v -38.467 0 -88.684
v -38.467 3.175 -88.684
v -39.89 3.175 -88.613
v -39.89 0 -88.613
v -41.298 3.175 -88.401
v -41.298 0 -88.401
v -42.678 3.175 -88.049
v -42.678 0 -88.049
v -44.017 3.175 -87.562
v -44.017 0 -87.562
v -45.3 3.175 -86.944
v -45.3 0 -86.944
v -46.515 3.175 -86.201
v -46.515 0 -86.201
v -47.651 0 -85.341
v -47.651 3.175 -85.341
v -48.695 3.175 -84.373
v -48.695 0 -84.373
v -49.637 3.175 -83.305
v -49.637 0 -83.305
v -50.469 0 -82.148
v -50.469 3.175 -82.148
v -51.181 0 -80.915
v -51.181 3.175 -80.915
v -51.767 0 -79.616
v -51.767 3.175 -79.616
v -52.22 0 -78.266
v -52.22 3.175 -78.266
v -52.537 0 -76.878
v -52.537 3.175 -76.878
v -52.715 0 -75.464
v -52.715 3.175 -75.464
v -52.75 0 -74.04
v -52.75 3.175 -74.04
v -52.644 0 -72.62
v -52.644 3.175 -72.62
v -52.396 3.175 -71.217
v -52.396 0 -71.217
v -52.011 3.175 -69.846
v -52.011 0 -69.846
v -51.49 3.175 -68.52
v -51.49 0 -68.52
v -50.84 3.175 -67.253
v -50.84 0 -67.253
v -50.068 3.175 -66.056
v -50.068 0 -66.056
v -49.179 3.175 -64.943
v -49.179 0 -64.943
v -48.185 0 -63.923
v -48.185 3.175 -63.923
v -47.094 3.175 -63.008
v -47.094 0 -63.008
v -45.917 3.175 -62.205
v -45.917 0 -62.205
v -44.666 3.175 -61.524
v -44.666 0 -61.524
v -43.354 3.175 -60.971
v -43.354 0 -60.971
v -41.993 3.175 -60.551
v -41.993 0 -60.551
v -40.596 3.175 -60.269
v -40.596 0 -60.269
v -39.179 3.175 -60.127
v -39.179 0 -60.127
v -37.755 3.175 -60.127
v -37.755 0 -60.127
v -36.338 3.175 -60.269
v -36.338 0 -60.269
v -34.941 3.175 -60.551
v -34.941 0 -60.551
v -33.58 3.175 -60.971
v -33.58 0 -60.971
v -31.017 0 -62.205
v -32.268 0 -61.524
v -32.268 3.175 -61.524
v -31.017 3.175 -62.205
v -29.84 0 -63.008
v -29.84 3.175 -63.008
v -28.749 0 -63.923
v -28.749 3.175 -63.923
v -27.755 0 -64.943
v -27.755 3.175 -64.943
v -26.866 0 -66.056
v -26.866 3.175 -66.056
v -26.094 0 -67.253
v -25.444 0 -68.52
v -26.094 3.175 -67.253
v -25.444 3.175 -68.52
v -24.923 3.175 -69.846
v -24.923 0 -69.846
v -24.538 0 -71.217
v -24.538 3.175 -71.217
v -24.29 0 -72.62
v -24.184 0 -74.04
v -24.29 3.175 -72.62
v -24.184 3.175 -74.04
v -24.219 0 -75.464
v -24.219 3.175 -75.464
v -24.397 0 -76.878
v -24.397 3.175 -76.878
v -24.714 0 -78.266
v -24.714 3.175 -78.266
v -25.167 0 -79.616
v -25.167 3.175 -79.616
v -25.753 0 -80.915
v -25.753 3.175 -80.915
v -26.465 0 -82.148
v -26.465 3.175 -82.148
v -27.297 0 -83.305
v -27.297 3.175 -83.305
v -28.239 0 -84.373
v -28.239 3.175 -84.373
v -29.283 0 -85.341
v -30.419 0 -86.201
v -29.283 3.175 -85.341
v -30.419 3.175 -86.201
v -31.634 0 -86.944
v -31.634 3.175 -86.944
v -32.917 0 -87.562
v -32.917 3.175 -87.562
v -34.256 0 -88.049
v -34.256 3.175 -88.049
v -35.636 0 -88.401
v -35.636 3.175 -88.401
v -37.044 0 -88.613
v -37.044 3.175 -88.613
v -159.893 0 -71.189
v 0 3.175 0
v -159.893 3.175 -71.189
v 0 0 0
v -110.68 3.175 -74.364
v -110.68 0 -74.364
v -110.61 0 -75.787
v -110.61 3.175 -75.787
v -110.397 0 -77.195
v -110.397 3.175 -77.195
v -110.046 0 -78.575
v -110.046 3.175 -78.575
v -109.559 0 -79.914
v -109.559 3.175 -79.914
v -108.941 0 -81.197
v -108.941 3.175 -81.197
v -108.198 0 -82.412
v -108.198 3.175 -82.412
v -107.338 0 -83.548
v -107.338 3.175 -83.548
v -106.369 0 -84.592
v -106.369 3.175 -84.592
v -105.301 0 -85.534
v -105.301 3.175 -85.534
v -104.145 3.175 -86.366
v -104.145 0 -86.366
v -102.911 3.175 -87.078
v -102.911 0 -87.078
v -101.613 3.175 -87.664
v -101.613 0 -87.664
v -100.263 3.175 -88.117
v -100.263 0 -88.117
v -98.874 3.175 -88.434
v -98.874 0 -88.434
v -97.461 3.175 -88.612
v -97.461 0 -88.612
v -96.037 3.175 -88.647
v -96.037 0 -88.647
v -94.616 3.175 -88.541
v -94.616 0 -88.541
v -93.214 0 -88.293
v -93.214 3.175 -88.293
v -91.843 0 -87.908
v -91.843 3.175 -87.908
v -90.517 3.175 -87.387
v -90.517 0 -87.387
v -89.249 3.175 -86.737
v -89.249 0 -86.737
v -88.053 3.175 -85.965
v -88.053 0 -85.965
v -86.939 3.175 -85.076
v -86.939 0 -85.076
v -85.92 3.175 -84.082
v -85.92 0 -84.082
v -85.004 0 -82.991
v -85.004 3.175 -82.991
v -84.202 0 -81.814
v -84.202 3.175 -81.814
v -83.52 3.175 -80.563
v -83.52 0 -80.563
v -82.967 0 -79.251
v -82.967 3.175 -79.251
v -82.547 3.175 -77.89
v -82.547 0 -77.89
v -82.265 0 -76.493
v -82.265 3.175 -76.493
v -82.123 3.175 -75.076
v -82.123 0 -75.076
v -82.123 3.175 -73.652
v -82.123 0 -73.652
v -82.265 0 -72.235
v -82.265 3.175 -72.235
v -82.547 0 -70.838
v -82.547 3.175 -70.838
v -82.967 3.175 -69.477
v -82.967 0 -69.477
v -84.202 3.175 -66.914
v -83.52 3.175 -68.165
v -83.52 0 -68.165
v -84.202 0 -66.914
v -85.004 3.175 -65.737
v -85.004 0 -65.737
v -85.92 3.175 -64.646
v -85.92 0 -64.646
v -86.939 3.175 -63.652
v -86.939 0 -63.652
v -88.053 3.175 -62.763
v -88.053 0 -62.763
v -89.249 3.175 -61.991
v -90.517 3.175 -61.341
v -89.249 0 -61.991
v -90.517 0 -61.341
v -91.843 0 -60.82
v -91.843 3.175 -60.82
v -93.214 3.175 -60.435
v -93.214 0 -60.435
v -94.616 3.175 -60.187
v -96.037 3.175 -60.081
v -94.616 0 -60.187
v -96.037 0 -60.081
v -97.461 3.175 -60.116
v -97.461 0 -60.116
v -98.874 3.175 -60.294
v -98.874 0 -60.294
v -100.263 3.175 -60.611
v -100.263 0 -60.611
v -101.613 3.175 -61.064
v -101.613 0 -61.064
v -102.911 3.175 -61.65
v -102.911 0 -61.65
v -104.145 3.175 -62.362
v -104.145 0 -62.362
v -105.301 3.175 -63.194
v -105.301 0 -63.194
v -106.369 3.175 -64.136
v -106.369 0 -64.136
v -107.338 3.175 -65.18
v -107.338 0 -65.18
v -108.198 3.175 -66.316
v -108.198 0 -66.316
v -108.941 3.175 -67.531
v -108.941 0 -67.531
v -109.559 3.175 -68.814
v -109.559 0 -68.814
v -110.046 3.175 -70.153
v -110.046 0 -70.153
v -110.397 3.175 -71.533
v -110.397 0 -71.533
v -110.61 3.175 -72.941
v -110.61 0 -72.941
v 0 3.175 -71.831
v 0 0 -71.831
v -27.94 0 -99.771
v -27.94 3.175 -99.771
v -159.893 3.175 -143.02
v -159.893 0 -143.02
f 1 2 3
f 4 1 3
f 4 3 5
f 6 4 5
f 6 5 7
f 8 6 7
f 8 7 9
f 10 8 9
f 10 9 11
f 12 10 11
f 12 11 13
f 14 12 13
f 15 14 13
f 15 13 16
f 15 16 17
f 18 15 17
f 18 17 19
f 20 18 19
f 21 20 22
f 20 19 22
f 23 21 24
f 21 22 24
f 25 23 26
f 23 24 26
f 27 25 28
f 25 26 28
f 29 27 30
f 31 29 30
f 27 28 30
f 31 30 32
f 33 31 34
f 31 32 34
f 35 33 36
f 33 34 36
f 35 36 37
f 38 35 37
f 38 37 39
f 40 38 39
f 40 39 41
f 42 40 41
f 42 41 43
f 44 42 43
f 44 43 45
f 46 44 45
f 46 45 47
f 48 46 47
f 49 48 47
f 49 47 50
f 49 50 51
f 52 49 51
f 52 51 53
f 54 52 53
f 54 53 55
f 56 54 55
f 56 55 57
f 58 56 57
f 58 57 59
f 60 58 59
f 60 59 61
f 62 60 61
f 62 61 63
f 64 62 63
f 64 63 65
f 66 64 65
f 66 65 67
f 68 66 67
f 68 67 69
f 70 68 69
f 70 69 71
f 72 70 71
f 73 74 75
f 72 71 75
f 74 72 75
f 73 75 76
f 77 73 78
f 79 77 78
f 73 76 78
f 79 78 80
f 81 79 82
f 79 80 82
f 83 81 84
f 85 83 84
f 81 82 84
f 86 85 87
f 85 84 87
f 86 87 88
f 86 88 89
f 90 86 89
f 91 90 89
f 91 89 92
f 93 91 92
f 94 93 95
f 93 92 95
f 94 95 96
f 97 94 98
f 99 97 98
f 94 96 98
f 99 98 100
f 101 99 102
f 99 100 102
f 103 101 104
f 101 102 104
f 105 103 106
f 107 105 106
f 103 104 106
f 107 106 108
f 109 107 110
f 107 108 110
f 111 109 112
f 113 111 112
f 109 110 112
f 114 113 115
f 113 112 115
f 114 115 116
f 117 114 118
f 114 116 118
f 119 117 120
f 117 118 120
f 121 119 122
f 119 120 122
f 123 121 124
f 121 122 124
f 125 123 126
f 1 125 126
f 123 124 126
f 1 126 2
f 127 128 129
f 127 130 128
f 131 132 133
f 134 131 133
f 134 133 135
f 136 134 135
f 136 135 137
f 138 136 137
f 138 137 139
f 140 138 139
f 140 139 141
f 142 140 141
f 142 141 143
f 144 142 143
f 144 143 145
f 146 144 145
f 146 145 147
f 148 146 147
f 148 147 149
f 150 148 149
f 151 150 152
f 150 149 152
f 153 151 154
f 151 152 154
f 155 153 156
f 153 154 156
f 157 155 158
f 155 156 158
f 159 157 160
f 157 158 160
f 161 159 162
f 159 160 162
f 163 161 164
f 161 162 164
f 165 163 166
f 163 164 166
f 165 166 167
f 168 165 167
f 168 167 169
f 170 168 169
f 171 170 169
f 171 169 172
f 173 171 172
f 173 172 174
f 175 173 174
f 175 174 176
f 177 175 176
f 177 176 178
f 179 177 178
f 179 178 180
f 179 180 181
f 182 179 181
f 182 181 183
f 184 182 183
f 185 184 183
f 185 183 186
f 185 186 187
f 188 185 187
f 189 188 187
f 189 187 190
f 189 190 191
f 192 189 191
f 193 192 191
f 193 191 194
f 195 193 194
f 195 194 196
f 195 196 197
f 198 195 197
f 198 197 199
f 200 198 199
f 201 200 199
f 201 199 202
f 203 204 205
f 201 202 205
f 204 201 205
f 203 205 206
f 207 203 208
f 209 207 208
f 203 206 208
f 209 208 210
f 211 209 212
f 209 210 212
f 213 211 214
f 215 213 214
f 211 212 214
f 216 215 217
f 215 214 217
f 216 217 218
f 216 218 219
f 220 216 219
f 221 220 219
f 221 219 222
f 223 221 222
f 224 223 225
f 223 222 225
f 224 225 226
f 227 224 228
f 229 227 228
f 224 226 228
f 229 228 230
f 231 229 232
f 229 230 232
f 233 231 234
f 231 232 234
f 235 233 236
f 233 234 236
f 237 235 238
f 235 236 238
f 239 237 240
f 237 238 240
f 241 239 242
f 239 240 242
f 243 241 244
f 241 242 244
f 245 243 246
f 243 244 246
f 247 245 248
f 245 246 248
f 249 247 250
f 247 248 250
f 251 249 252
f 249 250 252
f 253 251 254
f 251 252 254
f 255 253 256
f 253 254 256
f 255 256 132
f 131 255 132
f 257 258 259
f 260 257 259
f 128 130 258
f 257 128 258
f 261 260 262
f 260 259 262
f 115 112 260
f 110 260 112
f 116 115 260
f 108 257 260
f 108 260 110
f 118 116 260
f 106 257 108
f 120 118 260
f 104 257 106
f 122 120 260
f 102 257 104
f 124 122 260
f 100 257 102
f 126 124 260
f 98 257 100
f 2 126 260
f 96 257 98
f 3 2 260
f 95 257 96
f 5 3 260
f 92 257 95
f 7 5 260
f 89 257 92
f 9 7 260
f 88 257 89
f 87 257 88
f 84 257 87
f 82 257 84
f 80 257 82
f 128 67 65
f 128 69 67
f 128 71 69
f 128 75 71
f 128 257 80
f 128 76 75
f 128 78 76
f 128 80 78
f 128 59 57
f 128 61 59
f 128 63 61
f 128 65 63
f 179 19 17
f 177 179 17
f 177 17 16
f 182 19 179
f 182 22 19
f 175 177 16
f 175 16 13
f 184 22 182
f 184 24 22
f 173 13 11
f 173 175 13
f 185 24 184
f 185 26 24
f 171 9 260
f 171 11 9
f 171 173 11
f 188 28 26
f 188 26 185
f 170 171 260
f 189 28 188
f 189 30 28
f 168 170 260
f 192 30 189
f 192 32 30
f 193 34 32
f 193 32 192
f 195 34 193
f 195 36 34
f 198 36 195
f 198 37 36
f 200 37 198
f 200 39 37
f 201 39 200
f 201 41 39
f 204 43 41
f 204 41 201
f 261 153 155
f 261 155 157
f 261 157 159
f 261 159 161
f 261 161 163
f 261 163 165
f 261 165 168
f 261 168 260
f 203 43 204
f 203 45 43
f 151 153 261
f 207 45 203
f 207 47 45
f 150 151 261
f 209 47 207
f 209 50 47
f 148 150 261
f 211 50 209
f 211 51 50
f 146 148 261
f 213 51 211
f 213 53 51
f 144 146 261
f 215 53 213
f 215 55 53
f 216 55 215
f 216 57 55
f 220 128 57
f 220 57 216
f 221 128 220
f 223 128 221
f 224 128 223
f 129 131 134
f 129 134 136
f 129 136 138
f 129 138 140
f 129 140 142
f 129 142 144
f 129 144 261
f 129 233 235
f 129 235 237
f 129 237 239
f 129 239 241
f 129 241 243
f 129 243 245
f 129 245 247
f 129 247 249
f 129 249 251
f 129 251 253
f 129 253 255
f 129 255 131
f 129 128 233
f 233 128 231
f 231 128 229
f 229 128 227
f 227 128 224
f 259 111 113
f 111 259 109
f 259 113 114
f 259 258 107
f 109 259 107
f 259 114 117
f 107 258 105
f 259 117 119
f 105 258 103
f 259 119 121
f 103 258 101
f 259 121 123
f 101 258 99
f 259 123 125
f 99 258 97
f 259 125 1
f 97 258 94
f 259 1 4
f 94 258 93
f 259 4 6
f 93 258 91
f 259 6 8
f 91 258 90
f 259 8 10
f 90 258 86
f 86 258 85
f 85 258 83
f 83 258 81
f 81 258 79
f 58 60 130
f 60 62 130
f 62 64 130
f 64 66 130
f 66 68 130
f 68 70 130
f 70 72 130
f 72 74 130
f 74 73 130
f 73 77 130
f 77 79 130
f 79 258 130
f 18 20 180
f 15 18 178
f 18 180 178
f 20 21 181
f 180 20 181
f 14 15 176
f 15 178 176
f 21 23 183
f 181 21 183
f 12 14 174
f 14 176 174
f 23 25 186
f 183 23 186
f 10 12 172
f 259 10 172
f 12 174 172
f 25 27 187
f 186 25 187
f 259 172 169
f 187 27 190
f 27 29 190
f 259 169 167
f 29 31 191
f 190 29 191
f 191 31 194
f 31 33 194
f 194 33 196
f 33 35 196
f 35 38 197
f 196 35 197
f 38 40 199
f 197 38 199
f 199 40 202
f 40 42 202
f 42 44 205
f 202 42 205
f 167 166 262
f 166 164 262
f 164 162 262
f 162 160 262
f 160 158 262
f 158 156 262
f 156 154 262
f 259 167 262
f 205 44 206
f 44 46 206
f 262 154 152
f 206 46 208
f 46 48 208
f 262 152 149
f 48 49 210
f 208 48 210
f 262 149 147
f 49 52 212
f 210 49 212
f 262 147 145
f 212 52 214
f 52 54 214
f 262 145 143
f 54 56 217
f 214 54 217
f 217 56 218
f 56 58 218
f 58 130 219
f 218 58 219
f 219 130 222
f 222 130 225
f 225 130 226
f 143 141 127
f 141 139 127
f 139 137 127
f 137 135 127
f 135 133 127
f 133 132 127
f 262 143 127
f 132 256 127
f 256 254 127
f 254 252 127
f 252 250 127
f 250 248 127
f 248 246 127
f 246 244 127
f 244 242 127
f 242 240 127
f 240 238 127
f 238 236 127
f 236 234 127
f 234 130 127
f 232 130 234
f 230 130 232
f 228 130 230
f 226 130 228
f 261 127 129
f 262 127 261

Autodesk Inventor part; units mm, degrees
ref_plane "YZ Plane" through (0, 0, 0) normal (1, 0, 0) x (0, 1, 0)
ref_plane "XZ Plane" through (0, 0, 0) normal (0, 1, 0) x (-1, 0, 0)
ref_plane "XY Plane" through (0, 0, 0) normal (0, 0, 1) x (1, 0, 0)
sketch "Sketch1" plane through (0, 0, 0) normal (0, 1, 0) x (-1, 0, 0)
  line L0 (0, 0) -> (0, -71.8312)
  line L1 (0, 0) -> (159.893, -71.189)
  line L2 (159.893, -71.189) -> (159.893, -143.0202)
  line L3 (159.893, -143.0202) -> (0, -71.8312)
  circle A0 centre (96.393, -74.364) radius 14.2875
  line L4 (0, -71.8312) -> (27.94, -99.7712)
  line L5 (27.94, -99.7712) -> (159.893, -143.0202)
  point P0 (38.467, -74.3966)
  dimension "d0" = 71.8312
  dimension "d1" = 66
  dimension "d2" = 159.893
  dimension "d4" = 71.8312
  dimension "d5" = 3.175
  dimension "d6" = 63.5
  dimension "d7" = 28.575
  dimension "d10" = 38.467
  dimension "d11" = 74.3966
  dimension "d12" = 27.94
  dimension "d14" = 21
extrude "Extrusion1" add sketch "Sketch1" along normal blind 3.175 contours L1 L2 L3 L0
extrude "Extrusion3" add sketch "Sketch1" along normal blind 3.175 contours L3 L5 L4
hole "Hole2" at (-96.393, 0, -74.364) at (-38.467, 0, -74.3966) direction (0, 1, 0) diameter 28.575 end through all
properties part number "StorageGusset.ver1-1111-2020"
